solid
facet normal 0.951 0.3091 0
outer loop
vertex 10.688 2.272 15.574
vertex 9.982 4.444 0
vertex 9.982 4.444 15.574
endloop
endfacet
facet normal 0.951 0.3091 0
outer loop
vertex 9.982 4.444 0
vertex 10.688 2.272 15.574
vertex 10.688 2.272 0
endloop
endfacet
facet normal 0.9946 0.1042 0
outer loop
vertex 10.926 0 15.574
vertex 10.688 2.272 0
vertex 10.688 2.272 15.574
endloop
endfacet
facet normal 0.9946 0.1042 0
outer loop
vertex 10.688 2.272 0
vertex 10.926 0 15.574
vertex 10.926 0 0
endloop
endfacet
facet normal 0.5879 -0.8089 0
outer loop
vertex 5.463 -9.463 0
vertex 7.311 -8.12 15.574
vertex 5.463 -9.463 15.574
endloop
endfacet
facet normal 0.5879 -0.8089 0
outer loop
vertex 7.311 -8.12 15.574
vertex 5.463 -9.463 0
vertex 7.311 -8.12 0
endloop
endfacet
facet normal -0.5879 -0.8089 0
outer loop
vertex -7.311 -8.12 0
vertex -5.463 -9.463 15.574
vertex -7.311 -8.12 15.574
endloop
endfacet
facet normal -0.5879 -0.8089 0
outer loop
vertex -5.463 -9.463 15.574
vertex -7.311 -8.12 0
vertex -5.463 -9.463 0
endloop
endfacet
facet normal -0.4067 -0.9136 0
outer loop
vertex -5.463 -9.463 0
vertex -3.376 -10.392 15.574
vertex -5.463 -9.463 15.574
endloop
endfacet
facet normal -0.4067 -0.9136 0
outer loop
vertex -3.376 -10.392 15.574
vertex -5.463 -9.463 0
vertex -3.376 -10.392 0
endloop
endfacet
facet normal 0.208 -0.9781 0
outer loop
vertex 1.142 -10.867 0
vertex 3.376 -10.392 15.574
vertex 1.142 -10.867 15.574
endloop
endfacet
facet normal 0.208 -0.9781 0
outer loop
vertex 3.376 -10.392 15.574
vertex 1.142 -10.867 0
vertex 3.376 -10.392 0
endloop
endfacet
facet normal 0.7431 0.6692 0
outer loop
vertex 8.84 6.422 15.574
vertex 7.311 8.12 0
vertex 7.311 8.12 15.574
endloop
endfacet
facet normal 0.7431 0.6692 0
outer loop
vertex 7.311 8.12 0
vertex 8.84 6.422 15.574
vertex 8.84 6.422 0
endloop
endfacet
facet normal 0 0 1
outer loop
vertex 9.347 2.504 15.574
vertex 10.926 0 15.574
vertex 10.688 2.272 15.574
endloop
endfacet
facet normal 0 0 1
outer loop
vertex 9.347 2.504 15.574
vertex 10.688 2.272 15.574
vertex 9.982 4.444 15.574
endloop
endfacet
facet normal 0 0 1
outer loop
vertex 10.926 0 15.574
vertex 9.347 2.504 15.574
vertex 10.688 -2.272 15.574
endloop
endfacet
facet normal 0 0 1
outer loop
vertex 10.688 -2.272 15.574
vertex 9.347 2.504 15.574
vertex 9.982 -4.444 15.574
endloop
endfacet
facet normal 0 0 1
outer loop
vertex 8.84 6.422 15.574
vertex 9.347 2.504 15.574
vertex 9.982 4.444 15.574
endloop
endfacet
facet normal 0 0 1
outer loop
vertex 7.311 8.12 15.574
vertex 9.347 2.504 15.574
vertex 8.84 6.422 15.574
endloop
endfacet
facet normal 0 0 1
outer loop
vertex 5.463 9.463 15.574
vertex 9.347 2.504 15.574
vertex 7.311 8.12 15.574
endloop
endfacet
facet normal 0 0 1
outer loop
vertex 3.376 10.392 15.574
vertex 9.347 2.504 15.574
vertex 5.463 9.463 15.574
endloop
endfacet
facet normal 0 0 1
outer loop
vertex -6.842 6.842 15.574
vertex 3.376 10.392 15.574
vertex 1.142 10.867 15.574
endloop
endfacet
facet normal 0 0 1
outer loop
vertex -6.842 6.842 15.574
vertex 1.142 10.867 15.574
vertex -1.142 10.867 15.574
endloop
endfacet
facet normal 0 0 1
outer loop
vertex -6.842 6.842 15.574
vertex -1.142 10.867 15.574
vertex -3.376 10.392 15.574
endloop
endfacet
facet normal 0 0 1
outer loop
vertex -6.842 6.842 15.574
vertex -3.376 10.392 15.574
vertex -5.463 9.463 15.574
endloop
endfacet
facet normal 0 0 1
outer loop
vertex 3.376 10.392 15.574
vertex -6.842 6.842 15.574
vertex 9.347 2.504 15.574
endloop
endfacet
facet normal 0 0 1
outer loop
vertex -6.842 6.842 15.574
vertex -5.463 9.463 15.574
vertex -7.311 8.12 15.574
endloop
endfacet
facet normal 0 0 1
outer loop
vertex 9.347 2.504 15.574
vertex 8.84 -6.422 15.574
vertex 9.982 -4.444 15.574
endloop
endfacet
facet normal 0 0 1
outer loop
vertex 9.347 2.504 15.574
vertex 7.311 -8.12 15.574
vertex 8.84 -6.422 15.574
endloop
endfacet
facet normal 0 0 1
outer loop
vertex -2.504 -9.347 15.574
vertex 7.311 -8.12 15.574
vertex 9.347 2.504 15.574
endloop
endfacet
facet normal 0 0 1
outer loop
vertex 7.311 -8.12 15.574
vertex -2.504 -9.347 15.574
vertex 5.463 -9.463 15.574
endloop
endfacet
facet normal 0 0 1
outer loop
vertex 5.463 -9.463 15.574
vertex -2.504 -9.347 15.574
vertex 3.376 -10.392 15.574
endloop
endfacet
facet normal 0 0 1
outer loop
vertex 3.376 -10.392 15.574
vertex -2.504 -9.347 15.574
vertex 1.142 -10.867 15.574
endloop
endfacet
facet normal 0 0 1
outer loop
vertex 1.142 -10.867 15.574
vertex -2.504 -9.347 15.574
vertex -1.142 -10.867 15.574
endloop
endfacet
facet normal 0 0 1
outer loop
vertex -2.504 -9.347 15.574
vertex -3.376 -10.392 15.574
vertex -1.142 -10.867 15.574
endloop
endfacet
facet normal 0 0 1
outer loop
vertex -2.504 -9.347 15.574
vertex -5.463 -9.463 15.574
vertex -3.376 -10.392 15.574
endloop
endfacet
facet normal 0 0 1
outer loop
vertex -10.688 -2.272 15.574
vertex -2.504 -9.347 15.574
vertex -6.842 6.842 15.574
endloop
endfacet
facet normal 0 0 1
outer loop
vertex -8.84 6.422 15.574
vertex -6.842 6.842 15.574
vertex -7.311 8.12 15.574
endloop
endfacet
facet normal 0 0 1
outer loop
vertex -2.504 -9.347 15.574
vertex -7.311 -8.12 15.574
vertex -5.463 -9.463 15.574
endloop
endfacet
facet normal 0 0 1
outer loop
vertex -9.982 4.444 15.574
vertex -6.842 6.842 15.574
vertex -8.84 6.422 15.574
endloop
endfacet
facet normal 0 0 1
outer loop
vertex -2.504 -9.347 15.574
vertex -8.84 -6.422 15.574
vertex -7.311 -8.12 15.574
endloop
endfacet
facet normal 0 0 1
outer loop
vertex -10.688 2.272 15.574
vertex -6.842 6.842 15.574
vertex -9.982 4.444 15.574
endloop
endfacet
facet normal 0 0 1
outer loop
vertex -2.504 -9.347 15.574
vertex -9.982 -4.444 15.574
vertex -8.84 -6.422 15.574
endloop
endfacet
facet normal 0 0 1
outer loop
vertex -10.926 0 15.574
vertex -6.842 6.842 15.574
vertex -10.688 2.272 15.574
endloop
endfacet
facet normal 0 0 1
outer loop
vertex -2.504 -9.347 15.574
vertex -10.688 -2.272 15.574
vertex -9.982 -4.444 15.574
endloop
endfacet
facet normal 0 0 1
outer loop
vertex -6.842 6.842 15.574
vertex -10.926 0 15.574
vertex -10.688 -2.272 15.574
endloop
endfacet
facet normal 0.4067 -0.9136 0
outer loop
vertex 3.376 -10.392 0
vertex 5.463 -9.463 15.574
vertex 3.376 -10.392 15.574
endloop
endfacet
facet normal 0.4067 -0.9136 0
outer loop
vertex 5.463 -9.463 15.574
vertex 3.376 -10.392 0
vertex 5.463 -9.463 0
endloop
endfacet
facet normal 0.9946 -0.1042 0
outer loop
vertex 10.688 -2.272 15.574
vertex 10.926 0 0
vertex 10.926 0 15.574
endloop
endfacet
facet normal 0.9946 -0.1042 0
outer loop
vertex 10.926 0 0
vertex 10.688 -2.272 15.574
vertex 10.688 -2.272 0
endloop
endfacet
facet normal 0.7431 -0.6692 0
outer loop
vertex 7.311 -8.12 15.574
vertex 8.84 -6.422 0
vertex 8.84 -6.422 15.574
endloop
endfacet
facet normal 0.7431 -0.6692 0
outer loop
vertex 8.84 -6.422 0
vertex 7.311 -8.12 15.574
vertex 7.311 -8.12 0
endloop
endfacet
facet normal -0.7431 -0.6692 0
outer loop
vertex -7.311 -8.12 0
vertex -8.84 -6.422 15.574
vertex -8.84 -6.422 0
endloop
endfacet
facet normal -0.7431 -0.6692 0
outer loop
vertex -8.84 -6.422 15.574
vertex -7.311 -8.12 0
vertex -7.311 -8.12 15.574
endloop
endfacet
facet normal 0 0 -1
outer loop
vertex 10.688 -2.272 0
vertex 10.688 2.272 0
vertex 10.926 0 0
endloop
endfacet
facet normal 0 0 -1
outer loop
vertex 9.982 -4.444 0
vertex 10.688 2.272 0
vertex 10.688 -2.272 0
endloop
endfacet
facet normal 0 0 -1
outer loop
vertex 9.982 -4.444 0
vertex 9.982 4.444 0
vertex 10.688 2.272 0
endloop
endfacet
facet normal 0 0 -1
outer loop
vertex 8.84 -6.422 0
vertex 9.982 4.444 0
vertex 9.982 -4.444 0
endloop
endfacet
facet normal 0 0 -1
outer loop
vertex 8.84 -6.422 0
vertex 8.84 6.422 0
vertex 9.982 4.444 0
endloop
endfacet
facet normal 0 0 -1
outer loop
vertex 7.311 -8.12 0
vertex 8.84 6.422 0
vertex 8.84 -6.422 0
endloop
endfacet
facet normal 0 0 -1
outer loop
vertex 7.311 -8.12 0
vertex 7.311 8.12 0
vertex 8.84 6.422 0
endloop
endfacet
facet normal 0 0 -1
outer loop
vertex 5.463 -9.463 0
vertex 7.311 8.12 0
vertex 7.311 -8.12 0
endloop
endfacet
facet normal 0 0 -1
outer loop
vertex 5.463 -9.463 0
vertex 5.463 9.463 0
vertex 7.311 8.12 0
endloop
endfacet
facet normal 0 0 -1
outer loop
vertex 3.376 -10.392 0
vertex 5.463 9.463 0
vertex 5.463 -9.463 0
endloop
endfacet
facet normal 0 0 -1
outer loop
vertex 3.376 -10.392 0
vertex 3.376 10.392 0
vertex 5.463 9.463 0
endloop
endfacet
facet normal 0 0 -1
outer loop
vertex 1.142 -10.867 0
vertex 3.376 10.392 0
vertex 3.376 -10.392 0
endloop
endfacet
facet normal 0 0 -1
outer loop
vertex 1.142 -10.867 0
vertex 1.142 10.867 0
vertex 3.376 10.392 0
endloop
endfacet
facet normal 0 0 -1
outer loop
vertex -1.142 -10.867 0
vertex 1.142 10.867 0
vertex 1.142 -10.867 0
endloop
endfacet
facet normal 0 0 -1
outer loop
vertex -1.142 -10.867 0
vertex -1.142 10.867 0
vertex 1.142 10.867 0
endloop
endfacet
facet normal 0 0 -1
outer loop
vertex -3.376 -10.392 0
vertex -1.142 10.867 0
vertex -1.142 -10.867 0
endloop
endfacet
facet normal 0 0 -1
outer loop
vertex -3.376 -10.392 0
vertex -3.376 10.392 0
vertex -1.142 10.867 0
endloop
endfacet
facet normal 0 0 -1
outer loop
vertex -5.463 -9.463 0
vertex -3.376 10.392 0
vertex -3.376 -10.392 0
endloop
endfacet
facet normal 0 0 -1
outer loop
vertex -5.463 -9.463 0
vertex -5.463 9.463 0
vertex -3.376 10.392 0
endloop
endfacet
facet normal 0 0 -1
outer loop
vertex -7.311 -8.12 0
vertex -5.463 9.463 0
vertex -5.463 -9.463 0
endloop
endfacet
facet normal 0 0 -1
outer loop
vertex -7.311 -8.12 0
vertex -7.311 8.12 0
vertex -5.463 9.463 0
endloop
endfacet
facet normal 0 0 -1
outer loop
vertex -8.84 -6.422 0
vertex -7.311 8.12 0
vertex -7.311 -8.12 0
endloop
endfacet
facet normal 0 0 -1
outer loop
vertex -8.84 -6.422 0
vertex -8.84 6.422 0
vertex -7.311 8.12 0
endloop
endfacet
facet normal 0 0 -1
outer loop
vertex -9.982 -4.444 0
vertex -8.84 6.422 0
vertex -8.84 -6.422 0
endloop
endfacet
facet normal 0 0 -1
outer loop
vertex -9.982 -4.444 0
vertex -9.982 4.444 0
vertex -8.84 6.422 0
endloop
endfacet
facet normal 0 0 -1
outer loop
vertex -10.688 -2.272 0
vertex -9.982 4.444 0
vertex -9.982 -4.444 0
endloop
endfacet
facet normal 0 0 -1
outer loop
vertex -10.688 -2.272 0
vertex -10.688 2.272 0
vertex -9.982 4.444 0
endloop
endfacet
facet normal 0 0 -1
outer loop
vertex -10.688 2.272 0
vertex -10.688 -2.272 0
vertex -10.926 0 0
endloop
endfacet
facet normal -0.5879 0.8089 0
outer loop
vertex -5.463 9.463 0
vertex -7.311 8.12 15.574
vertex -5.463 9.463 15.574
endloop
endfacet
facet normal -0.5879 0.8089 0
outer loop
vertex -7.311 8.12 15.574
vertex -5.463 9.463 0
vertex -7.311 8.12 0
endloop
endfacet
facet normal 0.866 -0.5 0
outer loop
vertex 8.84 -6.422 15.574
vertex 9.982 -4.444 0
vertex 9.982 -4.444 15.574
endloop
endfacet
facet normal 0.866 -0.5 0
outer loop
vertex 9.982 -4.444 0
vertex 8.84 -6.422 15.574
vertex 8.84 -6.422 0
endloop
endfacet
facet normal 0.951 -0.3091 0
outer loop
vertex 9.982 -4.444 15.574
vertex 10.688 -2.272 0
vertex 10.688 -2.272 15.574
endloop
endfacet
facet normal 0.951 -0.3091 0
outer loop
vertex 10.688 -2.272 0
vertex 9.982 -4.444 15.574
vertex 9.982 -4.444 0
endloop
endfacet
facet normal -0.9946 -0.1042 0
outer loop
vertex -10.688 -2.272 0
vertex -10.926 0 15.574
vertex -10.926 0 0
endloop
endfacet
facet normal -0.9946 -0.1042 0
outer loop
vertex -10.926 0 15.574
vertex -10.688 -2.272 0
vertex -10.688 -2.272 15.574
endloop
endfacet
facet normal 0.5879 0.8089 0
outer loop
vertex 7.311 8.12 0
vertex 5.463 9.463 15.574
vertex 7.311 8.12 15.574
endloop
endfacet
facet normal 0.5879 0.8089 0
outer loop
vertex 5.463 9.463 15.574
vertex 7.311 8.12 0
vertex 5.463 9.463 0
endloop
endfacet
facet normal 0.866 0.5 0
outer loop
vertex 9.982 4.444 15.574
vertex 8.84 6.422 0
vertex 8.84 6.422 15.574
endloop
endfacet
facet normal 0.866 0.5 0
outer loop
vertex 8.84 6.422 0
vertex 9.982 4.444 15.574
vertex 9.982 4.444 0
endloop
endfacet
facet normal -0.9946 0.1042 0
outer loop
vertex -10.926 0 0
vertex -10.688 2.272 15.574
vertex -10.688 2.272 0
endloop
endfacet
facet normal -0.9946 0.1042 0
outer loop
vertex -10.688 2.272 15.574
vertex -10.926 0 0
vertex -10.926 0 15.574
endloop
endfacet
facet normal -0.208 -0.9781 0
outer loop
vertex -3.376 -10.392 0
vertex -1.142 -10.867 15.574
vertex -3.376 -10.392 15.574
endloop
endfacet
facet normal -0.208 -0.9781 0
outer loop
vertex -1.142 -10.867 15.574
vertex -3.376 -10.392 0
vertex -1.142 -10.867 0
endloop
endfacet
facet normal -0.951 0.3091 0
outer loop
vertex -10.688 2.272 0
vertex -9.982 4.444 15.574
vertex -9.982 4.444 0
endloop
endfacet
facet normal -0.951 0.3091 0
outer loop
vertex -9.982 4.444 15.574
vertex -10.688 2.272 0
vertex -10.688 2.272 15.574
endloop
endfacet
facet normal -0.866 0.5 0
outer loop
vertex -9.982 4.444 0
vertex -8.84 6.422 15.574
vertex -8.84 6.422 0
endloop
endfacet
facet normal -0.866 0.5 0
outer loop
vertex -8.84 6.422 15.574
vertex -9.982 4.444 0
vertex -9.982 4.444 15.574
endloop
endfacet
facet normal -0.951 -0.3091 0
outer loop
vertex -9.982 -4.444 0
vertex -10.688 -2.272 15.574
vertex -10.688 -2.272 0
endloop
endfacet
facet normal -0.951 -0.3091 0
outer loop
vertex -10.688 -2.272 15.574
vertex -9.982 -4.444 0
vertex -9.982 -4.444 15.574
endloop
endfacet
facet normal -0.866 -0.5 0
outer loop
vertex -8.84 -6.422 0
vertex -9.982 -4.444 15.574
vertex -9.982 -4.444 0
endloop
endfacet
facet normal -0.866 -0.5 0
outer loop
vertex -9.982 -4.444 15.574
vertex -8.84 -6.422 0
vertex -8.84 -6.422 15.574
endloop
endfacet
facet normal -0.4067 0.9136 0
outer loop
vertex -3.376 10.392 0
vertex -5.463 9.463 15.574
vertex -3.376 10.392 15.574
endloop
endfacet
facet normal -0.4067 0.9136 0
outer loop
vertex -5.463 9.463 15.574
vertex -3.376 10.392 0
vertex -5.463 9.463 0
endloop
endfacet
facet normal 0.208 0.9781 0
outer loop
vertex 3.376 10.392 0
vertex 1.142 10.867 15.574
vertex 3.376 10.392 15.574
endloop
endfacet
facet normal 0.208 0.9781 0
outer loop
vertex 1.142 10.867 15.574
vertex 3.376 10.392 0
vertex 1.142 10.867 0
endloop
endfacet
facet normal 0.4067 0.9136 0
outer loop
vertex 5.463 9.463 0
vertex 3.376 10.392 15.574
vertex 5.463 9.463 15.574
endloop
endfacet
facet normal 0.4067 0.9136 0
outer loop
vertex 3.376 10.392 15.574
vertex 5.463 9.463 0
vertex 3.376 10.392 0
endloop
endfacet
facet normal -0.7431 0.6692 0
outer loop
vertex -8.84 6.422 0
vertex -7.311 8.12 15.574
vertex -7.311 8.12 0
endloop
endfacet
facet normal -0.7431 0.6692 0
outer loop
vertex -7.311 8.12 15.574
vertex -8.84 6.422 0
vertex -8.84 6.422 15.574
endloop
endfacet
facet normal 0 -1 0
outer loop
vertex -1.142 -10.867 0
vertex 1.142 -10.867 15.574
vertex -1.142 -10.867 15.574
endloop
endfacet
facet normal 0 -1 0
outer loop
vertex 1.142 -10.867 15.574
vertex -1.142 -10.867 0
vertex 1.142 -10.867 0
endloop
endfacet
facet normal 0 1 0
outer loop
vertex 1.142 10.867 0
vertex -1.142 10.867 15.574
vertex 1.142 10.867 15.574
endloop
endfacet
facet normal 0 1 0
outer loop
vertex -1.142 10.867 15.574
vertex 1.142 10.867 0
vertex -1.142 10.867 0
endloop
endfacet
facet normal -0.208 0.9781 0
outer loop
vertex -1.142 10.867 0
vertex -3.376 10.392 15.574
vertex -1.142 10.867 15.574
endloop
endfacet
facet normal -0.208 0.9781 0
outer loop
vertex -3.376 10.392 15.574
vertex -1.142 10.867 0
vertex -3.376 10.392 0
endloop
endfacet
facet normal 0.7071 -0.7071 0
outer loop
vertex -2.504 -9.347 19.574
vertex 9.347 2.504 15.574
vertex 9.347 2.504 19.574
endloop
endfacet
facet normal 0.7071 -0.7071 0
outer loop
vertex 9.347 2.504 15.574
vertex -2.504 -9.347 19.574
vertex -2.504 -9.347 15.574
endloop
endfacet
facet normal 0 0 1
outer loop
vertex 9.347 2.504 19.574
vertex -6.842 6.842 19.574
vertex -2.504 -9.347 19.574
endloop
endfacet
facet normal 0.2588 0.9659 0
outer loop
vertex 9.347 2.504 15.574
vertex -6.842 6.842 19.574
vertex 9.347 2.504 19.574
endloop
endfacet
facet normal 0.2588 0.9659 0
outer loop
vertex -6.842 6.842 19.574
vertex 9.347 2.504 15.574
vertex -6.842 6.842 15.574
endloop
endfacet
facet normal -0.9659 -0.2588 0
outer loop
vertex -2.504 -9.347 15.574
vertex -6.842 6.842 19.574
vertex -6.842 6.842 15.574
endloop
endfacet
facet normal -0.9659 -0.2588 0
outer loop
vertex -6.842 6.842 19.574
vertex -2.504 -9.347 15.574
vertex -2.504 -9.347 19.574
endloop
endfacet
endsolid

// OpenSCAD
/* Hub module for omniwheel by Shira Epstein
 * This work is licensed under the Creative Commons Attribution 4.0 International License.
 * To view a copy of this license, visit http://creativecommons.org/licenses/by/4.0/.
 */

//Variables
hub_clearance = 1.5; //Clearance between the hub and the beads
wheelclearance = 2; //how much of a gap to allow between the two halves of the wheel
fitdepth = 4; //depth of the triangular key that allows a snap fit of the two halves of the omniwheel

printoffset = 0.25; // Pull the positive triangular key in by this much, to accomodate good fit w/negative
keyoffset = 1;//how far to pull in the corners of the triangular key from the edge of the hub center

r=30;


//Computed Variables
hub_center_r = sqrt(2)*r -r -hub_clearance; //Hub central radius
tri_r_n = hub_center_r - keyoffset; //Radius of circle into which triangular hole is inscribed
tri_r_p = tri_r_n - printoffset; //Radius of circle into which triangular key is inscribed

// - printoffset; //

//Central part of the hub
module hub_center(){
	linear_extrude(height=((2-sqrt(2))*r) + wheelclearance - fitdepth,center=false) {
		circle(hub_center_r);
	}
}

//The positive triangular key
module key_pos() {

	rotate([0,0,45]){
		translate([0,0,((2-sqrt(2))*r) + wheelclearance - fitdepth]) {
			linear_extrude(height=fitdepth, center=false) {
				polygon([[0,tri_r_p],[-sqrt(3)*tri_r_p/2,-tri_r_p/2],[sqrt(3)*tri_r_p/2,-tri_r_p/2]]);
			}
		}
	}
}

module hub_center_positive() {
	hub_center();
	key_pos();
}

hub_center_positive();
